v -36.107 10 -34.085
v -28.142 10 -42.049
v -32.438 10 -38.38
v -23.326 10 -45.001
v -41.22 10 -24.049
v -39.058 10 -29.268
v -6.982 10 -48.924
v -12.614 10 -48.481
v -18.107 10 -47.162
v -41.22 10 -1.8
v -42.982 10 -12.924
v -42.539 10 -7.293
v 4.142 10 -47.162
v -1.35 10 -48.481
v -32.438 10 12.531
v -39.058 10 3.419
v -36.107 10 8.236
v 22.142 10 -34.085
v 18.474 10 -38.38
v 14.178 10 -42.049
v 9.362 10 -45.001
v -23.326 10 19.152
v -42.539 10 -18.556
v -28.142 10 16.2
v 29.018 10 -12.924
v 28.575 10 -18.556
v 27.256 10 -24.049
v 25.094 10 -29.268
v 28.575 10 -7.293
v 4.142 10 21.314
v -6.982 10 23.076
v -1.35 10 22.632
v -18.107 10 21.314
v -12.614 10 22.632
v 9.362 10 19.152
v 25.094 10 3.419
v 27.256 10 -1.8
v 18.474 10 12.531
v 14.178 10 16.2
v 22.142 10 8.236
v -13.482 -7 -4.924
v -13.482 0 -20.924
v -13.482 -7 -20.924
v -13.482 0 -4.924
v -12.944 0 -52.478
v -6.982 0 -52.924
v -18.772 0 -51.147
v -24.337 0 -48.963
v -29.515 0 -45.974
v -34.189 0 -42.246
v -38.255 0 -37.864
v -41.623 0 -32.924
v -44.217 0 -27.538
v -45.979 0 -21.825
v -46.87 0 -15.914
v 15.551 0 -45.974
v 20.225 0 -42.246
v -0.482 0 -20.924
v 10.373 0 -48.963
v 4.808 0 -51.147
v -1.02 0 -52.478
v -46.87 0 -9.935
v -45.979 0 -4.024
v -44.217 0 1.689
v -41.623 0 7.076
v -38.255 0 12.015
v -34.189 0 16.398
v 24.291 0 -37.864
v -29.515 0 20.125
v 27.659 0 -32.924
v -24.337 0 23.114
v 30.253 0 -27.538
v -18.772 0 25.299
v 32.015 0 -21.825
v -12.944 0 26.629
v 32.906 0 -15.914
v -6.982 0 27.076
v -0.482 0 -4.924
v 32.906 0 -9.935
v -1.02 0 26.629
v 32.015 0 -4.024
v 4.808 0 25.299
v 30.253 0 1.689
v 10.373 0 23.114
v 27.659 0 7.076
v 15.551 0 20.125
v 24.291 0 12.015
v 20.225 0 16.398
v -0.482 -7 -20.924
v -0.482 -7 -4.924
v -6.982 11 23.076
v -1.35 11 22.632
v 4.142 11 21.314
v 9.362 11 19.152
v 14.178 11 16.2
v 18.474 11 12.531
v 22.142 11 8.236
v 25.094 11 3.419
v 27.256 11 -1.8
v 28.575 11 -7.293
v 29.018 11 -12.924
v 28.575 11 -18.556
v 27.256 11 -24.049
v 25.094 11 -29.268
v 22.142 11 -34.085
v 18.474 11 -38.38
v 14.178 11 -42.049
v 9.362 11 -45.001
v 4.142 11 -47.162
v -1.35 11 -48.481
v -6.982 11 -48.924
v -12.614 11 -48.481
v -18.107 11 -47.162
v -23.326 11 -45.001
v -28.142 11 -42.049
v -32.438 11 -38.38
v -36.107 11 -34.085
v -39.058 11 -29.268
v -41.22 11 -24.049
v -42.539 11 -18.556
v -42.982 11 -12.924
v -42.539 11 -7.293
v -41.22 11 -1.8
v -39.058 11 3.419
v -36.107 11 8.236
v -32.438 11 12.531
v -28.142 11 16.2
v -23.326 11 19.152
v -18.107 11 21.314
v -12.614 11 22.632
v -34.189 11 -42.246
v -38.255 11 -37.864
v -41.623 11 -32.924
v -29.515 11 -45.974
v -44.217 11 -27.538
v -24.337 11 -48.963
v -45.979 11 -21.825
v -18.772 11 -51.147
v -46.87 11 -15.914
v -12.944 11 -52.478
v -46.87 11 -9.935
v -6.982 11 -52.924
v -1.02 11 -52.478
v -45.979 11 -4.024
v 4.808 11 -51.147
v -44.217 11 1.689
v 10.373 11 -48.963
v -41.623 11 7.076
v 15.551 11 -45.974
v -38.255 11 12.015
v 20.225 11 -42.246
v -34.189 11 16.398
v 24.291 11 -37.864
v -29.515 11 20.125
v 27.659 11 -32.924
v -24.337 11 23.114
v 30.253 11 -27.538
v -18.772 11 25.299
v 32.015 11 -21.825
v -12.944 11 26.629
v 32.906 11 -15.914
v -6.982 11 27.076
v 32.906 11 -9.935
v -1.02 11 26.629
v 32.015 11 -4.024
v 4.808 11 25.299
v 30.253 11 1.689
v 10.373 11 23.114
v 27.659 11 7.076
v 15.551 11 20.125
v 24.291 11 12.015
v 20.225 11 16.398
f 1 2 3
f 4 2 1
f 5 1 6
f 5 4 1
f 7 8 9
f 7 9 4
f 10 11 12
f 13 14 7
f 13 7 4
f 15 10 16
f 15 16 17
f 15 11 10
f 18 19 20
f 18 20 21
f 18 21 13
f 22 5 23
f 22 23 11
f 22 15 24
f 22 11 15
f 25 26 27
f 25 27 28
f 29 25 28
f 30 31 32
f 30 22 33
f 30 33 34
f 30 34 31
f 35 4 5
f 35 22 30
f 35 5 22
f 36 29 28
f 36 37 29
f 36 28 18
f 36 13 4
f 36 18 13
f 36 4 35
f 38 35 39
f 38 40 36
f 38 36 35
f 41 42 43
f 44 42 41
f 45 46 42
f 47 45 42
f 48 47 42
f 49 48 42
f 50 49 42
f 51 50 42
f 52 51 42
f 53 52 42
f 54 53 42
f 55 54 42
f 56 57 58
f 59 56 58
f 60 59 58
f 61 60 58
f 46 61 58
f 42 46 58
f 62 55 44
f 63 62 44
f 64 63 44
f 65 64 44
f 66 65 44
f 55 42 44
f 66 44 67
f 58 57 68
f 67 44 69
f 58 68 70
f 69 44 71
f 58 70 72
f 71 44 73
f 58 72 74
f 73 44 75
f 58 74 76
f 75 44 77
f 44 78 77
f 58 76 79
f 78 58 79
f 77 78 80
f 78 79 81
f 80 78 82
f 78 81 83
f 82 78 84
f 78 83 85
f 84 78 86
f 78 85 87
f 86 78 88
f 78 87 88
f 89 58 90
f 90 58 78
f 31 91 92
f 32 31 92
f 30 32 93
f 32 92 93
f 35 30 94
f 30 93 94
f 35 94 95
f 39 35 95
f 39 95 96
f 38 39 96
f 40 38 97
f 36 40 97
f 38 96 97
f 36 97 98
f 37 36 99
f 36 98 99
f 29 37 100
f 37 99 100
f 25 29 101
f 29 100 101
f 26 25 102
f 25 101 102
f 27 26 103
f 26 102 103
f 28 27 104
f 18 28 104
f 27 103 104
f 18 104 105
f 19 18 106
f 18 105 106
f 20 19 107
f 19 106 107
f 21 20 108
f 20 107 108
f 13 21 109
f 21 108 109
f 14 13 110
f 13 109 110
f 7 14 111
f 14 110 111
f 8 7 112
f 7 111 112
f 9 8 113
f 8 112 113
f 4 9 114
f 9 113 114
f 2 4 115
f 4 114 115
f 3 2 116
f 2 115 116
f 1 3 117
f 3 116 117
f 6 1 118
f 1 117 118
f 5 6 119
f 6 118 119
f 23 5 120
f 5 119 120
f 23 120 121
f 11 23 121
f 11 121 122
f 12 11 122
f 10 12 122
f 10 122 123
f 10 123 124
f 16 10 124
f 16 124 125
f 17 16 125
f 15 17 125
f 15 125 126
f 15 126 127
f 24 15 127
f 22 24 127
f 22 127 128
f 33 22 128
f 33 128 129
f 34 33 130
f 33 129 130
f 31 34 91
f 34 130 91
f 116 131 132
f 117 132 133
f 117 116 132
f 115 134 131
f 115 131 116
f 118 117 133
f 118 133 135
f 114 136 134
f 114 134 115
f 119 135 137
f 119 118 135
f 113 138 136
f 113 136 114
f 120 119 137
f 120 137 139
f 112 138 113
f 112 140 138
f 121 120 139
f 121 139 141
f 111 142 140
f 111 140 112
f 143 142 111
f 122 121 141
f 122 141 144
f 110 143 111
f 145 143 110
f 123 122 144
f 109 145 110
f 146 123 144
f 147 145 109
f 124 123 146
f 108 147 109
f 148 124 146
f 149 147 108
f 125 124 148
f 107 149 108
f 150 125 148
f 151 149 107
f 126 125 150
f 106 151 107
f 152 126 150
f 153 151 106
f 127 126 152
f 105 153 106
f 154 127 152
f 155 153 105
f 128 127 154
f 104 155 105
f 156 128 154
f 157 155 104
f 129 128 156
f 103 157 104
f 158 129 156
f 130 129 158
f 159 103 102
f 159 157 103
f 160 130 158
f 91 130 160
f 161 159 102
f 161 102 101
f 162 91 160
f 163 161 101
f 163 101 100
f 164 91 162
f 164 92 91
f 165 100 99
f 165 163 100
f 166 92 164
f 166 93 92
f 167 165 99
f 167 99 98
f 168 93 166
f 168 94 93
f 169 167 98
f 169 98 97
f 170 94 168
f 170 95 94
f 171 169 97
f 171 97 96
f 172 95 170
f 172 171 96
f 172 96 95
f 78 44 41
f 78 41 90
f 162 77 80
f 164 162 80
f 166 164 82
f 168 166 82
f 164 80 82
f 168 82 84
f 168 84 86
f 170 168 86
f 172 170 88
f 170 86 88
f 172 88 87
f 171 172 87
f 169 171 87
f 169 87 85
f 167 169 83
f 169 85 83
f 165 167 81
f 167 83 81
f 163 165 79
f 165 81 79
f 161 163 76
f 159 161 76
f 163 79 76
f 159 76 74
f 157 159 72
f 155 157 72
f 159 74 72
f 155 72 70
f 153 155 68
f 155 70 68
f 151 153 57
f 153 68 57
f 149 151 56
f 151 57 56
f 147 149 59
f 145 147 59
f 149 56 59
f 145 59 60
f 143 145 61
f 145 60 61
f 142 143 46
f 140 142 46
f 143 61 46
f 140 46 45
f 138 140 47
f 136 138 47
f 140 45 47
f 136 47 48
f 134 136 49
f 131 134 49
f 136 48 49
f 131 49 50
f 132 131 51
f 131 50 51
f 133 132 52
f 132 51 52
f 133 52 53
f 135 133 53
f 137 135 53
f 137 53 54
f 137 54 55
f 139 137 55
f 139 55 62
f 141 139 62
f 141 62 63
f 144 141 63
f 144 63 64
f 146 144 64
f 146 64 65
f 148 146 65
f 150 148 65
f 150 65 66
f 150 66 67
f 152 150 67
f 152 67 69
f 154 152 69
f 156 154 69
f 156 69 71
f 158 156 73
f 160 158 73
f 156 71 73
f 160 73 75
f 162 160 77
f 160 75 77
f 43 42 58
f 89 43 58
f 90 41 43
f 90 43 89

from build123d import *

# Parameters (mm, degrees)
IZIM1_R                     = 40
Y_KSEKLIK_EKSTR_ZYON1_DEPTH = 11
IZIM2_R                     = 36
KES_EKSTR_ZYON2_DEPTH       = 1
IZIM3_W                     = 13
IZIM3_H                     = 16
Y_KSEKLIK_EKSTR_ZYON2_DEPTH = 7


with BuildPart() as part:
    # Çizim1 → Yükseklik-Ekstrüzyon1 (new body)
    with BuildSketch(Plane(origin=(0, 0, 0), x_dir=(1, 0, 0), z_dir=(0, 1, 0))):
        with Locations(Location((-6.982132923, 12.924373709, 0), (0, 0, 270))):
            Circle(IZIM1_R)
    extrude(amount=Y_KSEKLIK_EKSTR_ZYON1_DEPTH)

    # Çizim2 → Kes-Ekstrüzyon2 (cut)
    with BuildSketch(Plane(origin=(0, 11, 0), x_dir=(1, 0, 0), z_dir=(0, 1, 0))):
        with Locations(Location((-6.982132923, 12.924373709, 0), (0, 0, 270))):
            Circle(IZIM2_R)
    extrude(amount=-KES_EKSTR_ZYON2_DEPTH, mode=Mode.SUBTRACT)

    # Çizim3 → Yükseklik-Ekstrüzyon2 (add)
    with BuildSketch(Plane.XZ):
        with Locations((-6.982132923, -12.924373709)):
            Rectangle(IZIM3_W, IZIM3_H)
    extrude(amount=Y_KSEKLIK_EKSTR_ZYON2_DEPTH)


solid = part.part
